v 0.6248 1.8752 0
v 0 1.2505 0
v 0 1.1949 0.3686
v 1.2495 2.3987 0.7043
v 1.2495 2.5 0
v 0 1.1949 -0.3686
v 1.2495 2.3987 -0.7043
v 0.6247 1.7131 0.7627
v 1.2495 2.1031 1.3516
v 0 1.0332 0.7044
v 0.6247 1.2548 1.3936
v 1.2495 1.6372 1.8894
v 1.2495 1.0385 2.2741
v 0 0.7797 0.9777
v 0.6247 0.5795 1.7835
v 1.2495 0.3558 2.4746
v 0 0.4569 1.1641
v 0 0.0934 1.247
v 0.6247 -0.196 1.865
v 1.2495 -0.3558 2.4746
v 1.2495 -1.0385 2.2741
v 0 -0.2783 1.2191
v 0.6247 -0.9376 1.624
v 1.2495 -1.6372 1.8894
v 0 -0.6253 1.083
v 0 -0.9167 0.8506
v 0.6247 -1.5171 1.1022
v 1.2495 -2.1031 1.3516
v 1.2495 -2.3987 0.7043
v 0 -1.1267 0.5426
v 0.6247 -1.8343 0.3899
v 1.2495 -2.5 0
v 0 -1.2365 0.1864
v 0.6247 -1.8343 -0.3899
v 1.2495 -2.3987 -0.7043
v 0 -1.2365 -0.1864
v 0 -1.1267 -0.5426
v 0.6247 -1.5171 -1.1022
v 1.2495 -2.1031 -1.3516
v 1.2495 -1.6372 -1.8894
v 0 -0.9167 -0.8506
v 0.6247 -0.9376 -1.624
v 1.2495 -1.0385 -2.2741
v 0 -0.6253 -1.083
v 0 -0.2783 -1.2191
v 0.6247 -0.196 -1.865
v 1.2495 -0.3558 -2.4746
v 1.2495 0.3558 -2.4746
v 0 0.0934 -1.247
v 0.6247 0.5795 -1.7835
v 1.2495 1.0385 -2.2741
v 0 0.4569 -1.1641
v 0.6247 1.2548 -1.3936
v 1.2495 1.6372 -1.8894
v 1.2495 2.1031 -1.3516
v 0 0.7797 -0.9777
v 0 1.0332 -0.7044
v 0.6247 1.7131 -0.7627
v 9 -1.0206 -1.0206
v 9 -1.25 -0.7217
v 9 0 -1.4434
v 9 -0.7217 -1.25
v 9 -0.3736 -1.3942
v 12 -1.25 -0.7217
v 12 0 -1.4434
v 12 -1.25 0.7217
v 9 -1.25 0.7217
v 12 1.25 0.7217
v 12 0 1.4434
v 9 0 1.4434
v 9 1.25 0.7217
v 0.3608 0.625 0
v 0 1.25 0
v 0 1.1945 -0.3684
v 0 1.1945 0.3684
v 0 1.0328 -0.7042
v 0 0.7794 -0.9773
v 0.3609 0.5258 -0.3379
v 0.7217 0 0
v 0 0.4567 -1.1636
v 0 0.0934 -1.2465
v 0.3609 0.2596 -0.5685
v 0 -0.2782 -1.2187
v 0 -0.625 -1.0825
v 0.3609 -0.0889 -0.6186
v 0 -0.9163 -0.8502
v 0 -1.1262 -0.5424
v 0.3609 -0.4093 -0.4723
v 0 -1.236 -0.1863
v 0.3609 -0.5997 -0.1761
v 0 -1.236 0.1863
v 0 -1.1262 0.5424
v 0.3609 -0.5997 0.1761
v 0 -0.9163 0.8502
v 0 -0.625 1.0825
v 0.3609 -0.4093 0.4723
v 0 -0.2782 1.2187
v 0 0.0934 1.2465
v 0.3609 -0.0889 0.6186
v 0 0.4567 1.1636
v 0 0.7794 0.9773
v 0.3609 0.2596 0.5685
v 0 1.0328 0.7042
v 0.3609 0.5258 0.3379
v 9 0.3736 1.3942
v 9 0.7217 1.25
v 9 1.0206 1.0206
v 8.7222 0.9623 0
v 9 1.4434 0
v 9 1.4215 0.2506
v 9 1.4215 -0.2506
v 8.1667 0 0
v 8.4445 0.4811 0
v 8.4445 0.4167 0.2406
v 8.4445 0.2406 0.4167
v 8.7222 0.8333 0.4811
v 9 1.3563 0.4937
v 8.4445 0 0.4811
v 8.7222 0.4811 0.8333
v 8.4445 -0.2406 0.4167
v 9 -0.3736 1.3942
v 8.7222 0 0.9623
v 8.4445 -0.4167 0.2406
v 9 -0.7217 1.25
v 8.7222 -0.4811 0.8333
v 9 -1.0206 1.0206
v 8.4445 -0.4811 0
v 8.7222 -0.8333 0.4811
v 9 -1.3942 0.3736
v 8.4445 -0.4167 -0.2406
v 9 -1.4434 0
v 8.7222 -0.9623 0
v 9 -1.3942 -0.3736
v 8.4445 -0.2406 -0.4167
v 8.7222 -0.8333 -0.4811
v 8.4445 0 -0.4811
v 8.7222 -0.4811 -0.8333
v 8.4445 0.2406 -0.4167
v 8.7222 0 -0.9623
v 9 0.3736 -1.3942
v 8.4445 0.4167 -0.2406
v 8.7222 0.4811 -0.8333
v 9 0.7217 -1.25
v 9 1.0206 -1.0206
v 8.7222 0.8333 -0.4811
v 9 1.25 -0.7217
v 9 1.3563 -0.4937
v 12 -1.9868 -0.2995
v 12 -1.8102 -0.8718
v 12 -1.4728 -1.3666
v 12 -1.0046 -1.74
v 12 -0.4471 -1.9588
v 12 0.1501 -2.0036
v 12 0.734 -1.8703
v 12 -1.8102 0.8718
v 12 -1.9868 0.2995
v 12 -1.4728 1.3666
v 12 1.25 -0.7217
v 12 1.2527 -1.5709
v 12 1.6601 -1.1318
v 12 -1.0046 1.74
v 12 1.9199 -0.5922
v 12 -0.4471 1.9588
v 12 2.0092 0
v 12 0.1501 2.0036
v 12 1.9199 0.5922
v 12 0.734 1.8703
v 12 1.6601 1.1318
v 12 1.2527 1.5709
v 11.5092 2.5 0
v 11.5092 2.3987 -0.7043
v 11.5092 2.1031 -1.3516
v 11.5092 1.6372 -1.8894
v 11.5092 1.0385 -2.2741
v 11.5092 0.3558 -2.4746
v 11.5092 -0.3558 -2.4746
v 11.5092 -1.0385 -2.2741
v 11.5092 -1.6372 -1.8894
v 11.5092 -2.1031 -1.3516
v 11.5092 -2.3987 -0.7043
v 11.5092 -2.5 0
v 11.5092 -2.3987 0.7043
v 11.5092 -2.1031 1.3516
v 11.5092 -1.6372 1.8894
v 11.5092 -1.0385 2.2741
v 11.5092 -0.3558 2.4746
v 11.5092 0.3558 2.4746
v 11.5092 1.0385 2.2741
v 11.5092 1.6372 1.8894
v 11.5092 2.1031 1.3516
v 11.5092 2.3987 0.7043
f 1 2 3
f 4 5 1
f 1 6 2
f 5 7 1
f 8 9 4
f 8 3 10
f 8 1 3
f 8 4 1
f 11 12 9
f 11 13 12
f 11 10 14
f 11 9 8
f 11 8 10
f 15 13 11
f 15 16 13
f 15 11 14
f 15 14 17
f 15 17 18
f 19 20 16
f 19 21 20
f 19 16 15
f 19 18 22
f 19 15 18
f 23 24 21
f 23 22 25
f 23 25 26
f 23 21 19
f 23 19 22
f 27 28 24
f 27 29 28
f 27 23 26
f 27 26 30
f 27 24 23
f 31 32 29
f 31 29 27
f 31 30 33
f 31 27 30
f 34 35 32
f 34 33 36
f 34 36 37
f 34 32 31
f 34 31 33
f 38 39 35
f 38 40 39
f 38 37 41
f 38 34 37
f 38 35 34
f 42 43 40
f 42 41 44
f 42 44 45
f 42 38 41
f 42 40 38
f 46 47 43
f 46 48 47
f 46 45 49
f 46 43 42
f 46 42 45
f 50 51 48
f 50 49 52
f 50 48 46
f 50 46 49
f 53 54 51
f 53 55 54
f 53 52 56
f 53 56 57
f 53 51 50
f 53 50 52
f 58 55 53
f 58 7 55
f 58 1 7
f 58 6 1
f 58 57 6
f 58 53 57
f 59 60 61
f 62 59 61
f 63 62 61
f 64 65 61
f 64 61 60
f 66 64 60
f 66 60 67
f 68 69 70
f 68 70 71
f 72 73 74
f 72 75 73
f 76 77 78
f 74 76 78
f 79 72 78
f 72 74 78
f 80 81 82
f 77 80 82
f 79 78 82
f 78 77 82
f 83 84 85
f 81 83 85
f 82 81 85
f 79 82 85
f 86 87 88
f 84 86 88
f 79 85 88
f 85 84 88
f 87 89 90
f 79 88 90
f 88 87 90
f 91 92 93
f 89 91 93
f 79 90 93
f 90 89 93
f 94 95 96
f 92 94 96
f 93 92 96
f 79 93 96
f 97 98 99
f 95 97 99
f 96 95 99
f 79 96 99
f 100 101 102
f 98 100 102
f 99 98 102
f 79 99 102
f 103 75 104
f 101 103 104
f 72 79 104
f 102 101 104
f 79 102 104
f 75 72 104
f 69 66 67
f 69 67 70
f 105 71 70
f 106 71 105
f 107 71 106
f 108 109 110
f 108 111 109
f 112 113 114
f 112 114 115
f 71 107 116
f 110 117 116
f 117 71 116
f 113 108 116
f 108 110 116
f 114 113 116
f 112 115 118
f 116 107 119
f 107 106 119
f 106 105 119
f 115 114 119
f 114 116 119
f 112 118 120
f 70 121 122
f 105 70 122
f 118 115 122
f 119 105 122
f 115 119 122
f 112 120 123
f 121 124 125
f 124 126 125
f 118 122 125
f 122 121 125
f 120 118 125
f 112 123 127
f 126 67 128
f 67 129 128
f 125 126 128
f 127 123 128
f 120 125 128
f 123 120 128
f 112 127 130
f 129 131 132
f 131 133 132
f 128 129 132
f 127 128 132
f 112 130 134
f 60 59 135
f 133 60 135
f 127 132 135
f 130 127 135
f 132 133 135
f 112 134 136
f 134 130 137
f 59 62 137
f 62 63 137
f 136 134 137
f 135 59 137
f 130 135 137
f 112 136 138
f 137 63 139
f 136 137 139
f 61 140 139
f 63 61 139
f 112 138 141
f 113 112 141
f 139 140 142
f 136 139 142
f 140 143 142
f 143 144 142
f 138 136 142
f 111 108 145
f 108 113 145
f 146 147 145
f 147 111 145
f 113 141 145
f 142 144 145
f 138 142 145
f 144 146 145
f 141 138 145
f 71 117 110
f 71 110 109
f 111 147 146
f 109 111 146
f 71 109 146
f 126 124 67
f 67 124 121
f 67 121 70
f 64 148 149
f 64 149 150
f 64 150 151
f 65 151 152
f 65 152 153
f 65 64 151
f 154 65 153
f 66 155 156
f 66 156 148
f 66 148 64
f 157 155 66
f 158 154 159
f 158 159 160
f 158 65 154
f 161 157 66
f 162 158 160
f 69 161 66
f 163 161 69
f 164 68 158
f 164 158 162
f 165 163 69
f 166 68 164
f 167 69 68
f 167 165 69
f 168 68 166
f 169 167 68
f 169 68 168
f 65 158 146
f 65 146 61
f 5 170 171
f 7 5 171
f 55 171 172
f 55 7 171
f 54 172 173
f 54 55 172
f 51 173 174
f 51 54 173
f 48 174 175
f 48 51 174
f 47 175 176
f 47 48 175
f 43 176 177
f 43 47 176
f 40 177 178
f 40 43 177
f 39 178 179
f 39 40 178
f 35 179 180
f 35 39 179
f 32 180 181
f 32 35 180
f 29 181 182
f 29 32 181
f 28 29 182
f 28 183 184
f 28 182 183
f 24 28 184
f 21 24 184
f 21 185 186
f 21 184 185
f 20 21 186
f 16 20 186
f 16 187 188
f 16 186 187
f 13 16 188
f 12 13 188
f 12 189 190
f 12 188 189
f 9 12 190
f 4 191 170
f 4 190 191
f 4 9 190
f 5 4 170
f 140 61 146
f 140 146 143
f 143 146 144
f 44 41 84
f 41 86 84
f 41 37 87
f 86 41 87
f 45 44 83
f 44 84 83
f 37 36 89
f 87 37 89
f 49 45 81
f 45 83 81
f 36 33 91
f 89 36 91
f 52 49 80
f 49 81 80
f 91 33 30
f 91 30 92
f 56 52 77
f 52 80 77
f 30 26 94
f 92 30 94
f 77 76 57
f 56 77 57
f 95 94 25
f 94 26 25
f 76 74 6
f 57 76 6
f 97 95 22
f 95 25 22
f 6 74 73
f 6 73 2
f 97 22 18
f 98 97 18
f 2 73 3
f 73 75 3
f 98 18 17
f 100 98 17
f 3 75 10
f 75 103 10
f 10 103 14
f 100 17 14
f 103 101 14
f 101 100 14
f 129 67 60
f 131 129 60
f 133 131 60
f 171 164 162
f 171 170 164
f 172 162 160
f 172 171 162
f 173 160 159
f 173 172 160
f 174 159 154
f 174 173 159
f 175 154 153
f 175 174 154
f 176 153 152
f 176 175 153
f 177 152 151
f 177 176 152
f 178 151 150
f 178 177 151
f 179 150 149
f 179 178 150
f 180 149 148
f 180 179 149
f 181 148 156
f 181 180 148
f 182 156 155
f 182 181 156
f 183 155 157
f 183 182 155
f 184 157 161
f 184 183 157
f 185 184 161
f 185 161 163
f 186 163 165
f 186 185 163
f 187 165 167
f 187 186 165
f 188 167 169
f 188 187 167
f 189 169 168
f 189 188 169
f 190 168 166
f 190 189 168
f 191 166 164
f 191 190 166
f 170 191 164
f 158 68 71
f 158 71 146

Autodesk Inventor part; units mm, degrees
ref_plane "YZ Plane" through (0, 0, 0) normal (1, 0, 0) x (0, 1, 0)
ref_plane "XZ Plane" through (0, 0, 0) normal (0, 1, 0) x (-1, 0, 0)
sketch "Skizze1" plane through (0, 0, 0) normal (0, 0, 1) x (1, 0, 0)
  line L0 (0.7217, 0) -> (8.1667, 0)
  line L1 (12, 1.4434) -> (12, 2.5)
  line L2 (12, 2.5) -> (0, 2.5)
  line L3 (12, 1.4434) -> (9, 1.4434)
  line L4 (9, 1.4434) -> (8.1667, 0)
  line L5 (0, 1.25) -> (0.7217, 0)
  line L6 (0, -0.5) -> (0, 3) projected
  line L7 (0, 1.25) -> (0, 2.5)
  point P0 (0, 0)
  dimension "d0" = 3
  dimension "d1" = 60
  dimension "d2" = 5
  dimension "d3" = 2.8868
  dimension "d4" = 12
  dimension "d5" = 60
  dimension "d7" = 2.5
revolve "Körper" add sketch "Skizze1" angle 360 about axis through (0.7217, 0, 0) along (1, 0, 0)
sketch "Skizze2" plane through (12, 0, 0) normal (1, 0, 0) x (0, 0, -1)
  circle A0 centre (0, 0) radius 1.4434 projected
  circle A1 centre (0, 0) radius 2.5 projected
  line L0 (1.4434, 0) -> (0.7217, -1.25)
  line L1 (0.7217, -1.25) -> (-0.7217, -1.25)
  line L2 (-0.7217, -1.25) -> (-1.4434, 0)
  line L3 (-1.4434, 0) -> (-0.7217, 1.25)
  line L4 (-0.7217, 1.25) -> (0.7217, 1.25)
  line L5 (0.7217, 1.25) -> (1.4434, 0)
extrude "Loch" add sketch "Skizze2" against normal blind 3 contours L5 A0 | A0 L0 | L4 A0 | A0 L1 | L3 A0 | A0 L2
chamfer "Fase1" distance 1.25 angle 45 1 edges at (0, -2.5, 0) measured on face at (0, 2.0591, -0.1994)
thread "Gewinde" size "M5x0.8" class "6g" standard "ISO Metric profile" length 12
chamfer "Fase2" distance 0.4908 angle 45 1 edges at (12, -2.5, 0) measured on face at (4.833, 2.4919, -0.2012)
ref_plane "Work Plane1" through (6, 0, 0) normal (0, -0.5, -0.866) x (1, 0, 0)
equation "\"d0\" = INTI"
equation "\"d2\" = NND"
equation "\"d3\" = 1.1547 * SW"
equation "\"d4\" = NLG"
equation "\"d5\" = 0.5 * ANG"
equation "\"d7\" = SPD"
equation "\"d8\" = INTI"
equation "\"d10\" = -0.5 * SPD + 0.5 * NND"
equation "\"d11\" = FAWI"
equation "\"d33\" = -0.5 * SPD + 0.5 * NND"
equation "\"d14\" = NLG"
equation "\"d12\" = -0.5 * GD1 + 0.5 * NND"
equation "\"d13\" = FAWI"
equation "\"d34\" = -0.5 * GD1 + 0.5 * NND"
equation "\"NND\" = 5"
equation "\"NLG\" = 12"
equation "\"INTI\" = 3"
equation "\"FAWI\" = 45deg"
equation "\"SW\" = 2.5"
equation "\"GD1\" = THREADDIA - 1.2269 * PTC"
equation "\"ANG\" = 120deg"
equation "\"FAWI1\" = 45deg"
equation "\"SPD\" = 2.5"
equation "\"GUL\" = 0.61345 * PTC"
equation "\"TOA\" = 30deg"
equation "\"THREADDIA\" = 5"
equation "\"PTC\" = 0.8"
equation "\"GAL\" = 0.61345 * PTC"
equation "\"E0\" = 1.155 * SW"
properties part number "ISO 4029 - M5 x 12" material "Edelstahl, 440C"
